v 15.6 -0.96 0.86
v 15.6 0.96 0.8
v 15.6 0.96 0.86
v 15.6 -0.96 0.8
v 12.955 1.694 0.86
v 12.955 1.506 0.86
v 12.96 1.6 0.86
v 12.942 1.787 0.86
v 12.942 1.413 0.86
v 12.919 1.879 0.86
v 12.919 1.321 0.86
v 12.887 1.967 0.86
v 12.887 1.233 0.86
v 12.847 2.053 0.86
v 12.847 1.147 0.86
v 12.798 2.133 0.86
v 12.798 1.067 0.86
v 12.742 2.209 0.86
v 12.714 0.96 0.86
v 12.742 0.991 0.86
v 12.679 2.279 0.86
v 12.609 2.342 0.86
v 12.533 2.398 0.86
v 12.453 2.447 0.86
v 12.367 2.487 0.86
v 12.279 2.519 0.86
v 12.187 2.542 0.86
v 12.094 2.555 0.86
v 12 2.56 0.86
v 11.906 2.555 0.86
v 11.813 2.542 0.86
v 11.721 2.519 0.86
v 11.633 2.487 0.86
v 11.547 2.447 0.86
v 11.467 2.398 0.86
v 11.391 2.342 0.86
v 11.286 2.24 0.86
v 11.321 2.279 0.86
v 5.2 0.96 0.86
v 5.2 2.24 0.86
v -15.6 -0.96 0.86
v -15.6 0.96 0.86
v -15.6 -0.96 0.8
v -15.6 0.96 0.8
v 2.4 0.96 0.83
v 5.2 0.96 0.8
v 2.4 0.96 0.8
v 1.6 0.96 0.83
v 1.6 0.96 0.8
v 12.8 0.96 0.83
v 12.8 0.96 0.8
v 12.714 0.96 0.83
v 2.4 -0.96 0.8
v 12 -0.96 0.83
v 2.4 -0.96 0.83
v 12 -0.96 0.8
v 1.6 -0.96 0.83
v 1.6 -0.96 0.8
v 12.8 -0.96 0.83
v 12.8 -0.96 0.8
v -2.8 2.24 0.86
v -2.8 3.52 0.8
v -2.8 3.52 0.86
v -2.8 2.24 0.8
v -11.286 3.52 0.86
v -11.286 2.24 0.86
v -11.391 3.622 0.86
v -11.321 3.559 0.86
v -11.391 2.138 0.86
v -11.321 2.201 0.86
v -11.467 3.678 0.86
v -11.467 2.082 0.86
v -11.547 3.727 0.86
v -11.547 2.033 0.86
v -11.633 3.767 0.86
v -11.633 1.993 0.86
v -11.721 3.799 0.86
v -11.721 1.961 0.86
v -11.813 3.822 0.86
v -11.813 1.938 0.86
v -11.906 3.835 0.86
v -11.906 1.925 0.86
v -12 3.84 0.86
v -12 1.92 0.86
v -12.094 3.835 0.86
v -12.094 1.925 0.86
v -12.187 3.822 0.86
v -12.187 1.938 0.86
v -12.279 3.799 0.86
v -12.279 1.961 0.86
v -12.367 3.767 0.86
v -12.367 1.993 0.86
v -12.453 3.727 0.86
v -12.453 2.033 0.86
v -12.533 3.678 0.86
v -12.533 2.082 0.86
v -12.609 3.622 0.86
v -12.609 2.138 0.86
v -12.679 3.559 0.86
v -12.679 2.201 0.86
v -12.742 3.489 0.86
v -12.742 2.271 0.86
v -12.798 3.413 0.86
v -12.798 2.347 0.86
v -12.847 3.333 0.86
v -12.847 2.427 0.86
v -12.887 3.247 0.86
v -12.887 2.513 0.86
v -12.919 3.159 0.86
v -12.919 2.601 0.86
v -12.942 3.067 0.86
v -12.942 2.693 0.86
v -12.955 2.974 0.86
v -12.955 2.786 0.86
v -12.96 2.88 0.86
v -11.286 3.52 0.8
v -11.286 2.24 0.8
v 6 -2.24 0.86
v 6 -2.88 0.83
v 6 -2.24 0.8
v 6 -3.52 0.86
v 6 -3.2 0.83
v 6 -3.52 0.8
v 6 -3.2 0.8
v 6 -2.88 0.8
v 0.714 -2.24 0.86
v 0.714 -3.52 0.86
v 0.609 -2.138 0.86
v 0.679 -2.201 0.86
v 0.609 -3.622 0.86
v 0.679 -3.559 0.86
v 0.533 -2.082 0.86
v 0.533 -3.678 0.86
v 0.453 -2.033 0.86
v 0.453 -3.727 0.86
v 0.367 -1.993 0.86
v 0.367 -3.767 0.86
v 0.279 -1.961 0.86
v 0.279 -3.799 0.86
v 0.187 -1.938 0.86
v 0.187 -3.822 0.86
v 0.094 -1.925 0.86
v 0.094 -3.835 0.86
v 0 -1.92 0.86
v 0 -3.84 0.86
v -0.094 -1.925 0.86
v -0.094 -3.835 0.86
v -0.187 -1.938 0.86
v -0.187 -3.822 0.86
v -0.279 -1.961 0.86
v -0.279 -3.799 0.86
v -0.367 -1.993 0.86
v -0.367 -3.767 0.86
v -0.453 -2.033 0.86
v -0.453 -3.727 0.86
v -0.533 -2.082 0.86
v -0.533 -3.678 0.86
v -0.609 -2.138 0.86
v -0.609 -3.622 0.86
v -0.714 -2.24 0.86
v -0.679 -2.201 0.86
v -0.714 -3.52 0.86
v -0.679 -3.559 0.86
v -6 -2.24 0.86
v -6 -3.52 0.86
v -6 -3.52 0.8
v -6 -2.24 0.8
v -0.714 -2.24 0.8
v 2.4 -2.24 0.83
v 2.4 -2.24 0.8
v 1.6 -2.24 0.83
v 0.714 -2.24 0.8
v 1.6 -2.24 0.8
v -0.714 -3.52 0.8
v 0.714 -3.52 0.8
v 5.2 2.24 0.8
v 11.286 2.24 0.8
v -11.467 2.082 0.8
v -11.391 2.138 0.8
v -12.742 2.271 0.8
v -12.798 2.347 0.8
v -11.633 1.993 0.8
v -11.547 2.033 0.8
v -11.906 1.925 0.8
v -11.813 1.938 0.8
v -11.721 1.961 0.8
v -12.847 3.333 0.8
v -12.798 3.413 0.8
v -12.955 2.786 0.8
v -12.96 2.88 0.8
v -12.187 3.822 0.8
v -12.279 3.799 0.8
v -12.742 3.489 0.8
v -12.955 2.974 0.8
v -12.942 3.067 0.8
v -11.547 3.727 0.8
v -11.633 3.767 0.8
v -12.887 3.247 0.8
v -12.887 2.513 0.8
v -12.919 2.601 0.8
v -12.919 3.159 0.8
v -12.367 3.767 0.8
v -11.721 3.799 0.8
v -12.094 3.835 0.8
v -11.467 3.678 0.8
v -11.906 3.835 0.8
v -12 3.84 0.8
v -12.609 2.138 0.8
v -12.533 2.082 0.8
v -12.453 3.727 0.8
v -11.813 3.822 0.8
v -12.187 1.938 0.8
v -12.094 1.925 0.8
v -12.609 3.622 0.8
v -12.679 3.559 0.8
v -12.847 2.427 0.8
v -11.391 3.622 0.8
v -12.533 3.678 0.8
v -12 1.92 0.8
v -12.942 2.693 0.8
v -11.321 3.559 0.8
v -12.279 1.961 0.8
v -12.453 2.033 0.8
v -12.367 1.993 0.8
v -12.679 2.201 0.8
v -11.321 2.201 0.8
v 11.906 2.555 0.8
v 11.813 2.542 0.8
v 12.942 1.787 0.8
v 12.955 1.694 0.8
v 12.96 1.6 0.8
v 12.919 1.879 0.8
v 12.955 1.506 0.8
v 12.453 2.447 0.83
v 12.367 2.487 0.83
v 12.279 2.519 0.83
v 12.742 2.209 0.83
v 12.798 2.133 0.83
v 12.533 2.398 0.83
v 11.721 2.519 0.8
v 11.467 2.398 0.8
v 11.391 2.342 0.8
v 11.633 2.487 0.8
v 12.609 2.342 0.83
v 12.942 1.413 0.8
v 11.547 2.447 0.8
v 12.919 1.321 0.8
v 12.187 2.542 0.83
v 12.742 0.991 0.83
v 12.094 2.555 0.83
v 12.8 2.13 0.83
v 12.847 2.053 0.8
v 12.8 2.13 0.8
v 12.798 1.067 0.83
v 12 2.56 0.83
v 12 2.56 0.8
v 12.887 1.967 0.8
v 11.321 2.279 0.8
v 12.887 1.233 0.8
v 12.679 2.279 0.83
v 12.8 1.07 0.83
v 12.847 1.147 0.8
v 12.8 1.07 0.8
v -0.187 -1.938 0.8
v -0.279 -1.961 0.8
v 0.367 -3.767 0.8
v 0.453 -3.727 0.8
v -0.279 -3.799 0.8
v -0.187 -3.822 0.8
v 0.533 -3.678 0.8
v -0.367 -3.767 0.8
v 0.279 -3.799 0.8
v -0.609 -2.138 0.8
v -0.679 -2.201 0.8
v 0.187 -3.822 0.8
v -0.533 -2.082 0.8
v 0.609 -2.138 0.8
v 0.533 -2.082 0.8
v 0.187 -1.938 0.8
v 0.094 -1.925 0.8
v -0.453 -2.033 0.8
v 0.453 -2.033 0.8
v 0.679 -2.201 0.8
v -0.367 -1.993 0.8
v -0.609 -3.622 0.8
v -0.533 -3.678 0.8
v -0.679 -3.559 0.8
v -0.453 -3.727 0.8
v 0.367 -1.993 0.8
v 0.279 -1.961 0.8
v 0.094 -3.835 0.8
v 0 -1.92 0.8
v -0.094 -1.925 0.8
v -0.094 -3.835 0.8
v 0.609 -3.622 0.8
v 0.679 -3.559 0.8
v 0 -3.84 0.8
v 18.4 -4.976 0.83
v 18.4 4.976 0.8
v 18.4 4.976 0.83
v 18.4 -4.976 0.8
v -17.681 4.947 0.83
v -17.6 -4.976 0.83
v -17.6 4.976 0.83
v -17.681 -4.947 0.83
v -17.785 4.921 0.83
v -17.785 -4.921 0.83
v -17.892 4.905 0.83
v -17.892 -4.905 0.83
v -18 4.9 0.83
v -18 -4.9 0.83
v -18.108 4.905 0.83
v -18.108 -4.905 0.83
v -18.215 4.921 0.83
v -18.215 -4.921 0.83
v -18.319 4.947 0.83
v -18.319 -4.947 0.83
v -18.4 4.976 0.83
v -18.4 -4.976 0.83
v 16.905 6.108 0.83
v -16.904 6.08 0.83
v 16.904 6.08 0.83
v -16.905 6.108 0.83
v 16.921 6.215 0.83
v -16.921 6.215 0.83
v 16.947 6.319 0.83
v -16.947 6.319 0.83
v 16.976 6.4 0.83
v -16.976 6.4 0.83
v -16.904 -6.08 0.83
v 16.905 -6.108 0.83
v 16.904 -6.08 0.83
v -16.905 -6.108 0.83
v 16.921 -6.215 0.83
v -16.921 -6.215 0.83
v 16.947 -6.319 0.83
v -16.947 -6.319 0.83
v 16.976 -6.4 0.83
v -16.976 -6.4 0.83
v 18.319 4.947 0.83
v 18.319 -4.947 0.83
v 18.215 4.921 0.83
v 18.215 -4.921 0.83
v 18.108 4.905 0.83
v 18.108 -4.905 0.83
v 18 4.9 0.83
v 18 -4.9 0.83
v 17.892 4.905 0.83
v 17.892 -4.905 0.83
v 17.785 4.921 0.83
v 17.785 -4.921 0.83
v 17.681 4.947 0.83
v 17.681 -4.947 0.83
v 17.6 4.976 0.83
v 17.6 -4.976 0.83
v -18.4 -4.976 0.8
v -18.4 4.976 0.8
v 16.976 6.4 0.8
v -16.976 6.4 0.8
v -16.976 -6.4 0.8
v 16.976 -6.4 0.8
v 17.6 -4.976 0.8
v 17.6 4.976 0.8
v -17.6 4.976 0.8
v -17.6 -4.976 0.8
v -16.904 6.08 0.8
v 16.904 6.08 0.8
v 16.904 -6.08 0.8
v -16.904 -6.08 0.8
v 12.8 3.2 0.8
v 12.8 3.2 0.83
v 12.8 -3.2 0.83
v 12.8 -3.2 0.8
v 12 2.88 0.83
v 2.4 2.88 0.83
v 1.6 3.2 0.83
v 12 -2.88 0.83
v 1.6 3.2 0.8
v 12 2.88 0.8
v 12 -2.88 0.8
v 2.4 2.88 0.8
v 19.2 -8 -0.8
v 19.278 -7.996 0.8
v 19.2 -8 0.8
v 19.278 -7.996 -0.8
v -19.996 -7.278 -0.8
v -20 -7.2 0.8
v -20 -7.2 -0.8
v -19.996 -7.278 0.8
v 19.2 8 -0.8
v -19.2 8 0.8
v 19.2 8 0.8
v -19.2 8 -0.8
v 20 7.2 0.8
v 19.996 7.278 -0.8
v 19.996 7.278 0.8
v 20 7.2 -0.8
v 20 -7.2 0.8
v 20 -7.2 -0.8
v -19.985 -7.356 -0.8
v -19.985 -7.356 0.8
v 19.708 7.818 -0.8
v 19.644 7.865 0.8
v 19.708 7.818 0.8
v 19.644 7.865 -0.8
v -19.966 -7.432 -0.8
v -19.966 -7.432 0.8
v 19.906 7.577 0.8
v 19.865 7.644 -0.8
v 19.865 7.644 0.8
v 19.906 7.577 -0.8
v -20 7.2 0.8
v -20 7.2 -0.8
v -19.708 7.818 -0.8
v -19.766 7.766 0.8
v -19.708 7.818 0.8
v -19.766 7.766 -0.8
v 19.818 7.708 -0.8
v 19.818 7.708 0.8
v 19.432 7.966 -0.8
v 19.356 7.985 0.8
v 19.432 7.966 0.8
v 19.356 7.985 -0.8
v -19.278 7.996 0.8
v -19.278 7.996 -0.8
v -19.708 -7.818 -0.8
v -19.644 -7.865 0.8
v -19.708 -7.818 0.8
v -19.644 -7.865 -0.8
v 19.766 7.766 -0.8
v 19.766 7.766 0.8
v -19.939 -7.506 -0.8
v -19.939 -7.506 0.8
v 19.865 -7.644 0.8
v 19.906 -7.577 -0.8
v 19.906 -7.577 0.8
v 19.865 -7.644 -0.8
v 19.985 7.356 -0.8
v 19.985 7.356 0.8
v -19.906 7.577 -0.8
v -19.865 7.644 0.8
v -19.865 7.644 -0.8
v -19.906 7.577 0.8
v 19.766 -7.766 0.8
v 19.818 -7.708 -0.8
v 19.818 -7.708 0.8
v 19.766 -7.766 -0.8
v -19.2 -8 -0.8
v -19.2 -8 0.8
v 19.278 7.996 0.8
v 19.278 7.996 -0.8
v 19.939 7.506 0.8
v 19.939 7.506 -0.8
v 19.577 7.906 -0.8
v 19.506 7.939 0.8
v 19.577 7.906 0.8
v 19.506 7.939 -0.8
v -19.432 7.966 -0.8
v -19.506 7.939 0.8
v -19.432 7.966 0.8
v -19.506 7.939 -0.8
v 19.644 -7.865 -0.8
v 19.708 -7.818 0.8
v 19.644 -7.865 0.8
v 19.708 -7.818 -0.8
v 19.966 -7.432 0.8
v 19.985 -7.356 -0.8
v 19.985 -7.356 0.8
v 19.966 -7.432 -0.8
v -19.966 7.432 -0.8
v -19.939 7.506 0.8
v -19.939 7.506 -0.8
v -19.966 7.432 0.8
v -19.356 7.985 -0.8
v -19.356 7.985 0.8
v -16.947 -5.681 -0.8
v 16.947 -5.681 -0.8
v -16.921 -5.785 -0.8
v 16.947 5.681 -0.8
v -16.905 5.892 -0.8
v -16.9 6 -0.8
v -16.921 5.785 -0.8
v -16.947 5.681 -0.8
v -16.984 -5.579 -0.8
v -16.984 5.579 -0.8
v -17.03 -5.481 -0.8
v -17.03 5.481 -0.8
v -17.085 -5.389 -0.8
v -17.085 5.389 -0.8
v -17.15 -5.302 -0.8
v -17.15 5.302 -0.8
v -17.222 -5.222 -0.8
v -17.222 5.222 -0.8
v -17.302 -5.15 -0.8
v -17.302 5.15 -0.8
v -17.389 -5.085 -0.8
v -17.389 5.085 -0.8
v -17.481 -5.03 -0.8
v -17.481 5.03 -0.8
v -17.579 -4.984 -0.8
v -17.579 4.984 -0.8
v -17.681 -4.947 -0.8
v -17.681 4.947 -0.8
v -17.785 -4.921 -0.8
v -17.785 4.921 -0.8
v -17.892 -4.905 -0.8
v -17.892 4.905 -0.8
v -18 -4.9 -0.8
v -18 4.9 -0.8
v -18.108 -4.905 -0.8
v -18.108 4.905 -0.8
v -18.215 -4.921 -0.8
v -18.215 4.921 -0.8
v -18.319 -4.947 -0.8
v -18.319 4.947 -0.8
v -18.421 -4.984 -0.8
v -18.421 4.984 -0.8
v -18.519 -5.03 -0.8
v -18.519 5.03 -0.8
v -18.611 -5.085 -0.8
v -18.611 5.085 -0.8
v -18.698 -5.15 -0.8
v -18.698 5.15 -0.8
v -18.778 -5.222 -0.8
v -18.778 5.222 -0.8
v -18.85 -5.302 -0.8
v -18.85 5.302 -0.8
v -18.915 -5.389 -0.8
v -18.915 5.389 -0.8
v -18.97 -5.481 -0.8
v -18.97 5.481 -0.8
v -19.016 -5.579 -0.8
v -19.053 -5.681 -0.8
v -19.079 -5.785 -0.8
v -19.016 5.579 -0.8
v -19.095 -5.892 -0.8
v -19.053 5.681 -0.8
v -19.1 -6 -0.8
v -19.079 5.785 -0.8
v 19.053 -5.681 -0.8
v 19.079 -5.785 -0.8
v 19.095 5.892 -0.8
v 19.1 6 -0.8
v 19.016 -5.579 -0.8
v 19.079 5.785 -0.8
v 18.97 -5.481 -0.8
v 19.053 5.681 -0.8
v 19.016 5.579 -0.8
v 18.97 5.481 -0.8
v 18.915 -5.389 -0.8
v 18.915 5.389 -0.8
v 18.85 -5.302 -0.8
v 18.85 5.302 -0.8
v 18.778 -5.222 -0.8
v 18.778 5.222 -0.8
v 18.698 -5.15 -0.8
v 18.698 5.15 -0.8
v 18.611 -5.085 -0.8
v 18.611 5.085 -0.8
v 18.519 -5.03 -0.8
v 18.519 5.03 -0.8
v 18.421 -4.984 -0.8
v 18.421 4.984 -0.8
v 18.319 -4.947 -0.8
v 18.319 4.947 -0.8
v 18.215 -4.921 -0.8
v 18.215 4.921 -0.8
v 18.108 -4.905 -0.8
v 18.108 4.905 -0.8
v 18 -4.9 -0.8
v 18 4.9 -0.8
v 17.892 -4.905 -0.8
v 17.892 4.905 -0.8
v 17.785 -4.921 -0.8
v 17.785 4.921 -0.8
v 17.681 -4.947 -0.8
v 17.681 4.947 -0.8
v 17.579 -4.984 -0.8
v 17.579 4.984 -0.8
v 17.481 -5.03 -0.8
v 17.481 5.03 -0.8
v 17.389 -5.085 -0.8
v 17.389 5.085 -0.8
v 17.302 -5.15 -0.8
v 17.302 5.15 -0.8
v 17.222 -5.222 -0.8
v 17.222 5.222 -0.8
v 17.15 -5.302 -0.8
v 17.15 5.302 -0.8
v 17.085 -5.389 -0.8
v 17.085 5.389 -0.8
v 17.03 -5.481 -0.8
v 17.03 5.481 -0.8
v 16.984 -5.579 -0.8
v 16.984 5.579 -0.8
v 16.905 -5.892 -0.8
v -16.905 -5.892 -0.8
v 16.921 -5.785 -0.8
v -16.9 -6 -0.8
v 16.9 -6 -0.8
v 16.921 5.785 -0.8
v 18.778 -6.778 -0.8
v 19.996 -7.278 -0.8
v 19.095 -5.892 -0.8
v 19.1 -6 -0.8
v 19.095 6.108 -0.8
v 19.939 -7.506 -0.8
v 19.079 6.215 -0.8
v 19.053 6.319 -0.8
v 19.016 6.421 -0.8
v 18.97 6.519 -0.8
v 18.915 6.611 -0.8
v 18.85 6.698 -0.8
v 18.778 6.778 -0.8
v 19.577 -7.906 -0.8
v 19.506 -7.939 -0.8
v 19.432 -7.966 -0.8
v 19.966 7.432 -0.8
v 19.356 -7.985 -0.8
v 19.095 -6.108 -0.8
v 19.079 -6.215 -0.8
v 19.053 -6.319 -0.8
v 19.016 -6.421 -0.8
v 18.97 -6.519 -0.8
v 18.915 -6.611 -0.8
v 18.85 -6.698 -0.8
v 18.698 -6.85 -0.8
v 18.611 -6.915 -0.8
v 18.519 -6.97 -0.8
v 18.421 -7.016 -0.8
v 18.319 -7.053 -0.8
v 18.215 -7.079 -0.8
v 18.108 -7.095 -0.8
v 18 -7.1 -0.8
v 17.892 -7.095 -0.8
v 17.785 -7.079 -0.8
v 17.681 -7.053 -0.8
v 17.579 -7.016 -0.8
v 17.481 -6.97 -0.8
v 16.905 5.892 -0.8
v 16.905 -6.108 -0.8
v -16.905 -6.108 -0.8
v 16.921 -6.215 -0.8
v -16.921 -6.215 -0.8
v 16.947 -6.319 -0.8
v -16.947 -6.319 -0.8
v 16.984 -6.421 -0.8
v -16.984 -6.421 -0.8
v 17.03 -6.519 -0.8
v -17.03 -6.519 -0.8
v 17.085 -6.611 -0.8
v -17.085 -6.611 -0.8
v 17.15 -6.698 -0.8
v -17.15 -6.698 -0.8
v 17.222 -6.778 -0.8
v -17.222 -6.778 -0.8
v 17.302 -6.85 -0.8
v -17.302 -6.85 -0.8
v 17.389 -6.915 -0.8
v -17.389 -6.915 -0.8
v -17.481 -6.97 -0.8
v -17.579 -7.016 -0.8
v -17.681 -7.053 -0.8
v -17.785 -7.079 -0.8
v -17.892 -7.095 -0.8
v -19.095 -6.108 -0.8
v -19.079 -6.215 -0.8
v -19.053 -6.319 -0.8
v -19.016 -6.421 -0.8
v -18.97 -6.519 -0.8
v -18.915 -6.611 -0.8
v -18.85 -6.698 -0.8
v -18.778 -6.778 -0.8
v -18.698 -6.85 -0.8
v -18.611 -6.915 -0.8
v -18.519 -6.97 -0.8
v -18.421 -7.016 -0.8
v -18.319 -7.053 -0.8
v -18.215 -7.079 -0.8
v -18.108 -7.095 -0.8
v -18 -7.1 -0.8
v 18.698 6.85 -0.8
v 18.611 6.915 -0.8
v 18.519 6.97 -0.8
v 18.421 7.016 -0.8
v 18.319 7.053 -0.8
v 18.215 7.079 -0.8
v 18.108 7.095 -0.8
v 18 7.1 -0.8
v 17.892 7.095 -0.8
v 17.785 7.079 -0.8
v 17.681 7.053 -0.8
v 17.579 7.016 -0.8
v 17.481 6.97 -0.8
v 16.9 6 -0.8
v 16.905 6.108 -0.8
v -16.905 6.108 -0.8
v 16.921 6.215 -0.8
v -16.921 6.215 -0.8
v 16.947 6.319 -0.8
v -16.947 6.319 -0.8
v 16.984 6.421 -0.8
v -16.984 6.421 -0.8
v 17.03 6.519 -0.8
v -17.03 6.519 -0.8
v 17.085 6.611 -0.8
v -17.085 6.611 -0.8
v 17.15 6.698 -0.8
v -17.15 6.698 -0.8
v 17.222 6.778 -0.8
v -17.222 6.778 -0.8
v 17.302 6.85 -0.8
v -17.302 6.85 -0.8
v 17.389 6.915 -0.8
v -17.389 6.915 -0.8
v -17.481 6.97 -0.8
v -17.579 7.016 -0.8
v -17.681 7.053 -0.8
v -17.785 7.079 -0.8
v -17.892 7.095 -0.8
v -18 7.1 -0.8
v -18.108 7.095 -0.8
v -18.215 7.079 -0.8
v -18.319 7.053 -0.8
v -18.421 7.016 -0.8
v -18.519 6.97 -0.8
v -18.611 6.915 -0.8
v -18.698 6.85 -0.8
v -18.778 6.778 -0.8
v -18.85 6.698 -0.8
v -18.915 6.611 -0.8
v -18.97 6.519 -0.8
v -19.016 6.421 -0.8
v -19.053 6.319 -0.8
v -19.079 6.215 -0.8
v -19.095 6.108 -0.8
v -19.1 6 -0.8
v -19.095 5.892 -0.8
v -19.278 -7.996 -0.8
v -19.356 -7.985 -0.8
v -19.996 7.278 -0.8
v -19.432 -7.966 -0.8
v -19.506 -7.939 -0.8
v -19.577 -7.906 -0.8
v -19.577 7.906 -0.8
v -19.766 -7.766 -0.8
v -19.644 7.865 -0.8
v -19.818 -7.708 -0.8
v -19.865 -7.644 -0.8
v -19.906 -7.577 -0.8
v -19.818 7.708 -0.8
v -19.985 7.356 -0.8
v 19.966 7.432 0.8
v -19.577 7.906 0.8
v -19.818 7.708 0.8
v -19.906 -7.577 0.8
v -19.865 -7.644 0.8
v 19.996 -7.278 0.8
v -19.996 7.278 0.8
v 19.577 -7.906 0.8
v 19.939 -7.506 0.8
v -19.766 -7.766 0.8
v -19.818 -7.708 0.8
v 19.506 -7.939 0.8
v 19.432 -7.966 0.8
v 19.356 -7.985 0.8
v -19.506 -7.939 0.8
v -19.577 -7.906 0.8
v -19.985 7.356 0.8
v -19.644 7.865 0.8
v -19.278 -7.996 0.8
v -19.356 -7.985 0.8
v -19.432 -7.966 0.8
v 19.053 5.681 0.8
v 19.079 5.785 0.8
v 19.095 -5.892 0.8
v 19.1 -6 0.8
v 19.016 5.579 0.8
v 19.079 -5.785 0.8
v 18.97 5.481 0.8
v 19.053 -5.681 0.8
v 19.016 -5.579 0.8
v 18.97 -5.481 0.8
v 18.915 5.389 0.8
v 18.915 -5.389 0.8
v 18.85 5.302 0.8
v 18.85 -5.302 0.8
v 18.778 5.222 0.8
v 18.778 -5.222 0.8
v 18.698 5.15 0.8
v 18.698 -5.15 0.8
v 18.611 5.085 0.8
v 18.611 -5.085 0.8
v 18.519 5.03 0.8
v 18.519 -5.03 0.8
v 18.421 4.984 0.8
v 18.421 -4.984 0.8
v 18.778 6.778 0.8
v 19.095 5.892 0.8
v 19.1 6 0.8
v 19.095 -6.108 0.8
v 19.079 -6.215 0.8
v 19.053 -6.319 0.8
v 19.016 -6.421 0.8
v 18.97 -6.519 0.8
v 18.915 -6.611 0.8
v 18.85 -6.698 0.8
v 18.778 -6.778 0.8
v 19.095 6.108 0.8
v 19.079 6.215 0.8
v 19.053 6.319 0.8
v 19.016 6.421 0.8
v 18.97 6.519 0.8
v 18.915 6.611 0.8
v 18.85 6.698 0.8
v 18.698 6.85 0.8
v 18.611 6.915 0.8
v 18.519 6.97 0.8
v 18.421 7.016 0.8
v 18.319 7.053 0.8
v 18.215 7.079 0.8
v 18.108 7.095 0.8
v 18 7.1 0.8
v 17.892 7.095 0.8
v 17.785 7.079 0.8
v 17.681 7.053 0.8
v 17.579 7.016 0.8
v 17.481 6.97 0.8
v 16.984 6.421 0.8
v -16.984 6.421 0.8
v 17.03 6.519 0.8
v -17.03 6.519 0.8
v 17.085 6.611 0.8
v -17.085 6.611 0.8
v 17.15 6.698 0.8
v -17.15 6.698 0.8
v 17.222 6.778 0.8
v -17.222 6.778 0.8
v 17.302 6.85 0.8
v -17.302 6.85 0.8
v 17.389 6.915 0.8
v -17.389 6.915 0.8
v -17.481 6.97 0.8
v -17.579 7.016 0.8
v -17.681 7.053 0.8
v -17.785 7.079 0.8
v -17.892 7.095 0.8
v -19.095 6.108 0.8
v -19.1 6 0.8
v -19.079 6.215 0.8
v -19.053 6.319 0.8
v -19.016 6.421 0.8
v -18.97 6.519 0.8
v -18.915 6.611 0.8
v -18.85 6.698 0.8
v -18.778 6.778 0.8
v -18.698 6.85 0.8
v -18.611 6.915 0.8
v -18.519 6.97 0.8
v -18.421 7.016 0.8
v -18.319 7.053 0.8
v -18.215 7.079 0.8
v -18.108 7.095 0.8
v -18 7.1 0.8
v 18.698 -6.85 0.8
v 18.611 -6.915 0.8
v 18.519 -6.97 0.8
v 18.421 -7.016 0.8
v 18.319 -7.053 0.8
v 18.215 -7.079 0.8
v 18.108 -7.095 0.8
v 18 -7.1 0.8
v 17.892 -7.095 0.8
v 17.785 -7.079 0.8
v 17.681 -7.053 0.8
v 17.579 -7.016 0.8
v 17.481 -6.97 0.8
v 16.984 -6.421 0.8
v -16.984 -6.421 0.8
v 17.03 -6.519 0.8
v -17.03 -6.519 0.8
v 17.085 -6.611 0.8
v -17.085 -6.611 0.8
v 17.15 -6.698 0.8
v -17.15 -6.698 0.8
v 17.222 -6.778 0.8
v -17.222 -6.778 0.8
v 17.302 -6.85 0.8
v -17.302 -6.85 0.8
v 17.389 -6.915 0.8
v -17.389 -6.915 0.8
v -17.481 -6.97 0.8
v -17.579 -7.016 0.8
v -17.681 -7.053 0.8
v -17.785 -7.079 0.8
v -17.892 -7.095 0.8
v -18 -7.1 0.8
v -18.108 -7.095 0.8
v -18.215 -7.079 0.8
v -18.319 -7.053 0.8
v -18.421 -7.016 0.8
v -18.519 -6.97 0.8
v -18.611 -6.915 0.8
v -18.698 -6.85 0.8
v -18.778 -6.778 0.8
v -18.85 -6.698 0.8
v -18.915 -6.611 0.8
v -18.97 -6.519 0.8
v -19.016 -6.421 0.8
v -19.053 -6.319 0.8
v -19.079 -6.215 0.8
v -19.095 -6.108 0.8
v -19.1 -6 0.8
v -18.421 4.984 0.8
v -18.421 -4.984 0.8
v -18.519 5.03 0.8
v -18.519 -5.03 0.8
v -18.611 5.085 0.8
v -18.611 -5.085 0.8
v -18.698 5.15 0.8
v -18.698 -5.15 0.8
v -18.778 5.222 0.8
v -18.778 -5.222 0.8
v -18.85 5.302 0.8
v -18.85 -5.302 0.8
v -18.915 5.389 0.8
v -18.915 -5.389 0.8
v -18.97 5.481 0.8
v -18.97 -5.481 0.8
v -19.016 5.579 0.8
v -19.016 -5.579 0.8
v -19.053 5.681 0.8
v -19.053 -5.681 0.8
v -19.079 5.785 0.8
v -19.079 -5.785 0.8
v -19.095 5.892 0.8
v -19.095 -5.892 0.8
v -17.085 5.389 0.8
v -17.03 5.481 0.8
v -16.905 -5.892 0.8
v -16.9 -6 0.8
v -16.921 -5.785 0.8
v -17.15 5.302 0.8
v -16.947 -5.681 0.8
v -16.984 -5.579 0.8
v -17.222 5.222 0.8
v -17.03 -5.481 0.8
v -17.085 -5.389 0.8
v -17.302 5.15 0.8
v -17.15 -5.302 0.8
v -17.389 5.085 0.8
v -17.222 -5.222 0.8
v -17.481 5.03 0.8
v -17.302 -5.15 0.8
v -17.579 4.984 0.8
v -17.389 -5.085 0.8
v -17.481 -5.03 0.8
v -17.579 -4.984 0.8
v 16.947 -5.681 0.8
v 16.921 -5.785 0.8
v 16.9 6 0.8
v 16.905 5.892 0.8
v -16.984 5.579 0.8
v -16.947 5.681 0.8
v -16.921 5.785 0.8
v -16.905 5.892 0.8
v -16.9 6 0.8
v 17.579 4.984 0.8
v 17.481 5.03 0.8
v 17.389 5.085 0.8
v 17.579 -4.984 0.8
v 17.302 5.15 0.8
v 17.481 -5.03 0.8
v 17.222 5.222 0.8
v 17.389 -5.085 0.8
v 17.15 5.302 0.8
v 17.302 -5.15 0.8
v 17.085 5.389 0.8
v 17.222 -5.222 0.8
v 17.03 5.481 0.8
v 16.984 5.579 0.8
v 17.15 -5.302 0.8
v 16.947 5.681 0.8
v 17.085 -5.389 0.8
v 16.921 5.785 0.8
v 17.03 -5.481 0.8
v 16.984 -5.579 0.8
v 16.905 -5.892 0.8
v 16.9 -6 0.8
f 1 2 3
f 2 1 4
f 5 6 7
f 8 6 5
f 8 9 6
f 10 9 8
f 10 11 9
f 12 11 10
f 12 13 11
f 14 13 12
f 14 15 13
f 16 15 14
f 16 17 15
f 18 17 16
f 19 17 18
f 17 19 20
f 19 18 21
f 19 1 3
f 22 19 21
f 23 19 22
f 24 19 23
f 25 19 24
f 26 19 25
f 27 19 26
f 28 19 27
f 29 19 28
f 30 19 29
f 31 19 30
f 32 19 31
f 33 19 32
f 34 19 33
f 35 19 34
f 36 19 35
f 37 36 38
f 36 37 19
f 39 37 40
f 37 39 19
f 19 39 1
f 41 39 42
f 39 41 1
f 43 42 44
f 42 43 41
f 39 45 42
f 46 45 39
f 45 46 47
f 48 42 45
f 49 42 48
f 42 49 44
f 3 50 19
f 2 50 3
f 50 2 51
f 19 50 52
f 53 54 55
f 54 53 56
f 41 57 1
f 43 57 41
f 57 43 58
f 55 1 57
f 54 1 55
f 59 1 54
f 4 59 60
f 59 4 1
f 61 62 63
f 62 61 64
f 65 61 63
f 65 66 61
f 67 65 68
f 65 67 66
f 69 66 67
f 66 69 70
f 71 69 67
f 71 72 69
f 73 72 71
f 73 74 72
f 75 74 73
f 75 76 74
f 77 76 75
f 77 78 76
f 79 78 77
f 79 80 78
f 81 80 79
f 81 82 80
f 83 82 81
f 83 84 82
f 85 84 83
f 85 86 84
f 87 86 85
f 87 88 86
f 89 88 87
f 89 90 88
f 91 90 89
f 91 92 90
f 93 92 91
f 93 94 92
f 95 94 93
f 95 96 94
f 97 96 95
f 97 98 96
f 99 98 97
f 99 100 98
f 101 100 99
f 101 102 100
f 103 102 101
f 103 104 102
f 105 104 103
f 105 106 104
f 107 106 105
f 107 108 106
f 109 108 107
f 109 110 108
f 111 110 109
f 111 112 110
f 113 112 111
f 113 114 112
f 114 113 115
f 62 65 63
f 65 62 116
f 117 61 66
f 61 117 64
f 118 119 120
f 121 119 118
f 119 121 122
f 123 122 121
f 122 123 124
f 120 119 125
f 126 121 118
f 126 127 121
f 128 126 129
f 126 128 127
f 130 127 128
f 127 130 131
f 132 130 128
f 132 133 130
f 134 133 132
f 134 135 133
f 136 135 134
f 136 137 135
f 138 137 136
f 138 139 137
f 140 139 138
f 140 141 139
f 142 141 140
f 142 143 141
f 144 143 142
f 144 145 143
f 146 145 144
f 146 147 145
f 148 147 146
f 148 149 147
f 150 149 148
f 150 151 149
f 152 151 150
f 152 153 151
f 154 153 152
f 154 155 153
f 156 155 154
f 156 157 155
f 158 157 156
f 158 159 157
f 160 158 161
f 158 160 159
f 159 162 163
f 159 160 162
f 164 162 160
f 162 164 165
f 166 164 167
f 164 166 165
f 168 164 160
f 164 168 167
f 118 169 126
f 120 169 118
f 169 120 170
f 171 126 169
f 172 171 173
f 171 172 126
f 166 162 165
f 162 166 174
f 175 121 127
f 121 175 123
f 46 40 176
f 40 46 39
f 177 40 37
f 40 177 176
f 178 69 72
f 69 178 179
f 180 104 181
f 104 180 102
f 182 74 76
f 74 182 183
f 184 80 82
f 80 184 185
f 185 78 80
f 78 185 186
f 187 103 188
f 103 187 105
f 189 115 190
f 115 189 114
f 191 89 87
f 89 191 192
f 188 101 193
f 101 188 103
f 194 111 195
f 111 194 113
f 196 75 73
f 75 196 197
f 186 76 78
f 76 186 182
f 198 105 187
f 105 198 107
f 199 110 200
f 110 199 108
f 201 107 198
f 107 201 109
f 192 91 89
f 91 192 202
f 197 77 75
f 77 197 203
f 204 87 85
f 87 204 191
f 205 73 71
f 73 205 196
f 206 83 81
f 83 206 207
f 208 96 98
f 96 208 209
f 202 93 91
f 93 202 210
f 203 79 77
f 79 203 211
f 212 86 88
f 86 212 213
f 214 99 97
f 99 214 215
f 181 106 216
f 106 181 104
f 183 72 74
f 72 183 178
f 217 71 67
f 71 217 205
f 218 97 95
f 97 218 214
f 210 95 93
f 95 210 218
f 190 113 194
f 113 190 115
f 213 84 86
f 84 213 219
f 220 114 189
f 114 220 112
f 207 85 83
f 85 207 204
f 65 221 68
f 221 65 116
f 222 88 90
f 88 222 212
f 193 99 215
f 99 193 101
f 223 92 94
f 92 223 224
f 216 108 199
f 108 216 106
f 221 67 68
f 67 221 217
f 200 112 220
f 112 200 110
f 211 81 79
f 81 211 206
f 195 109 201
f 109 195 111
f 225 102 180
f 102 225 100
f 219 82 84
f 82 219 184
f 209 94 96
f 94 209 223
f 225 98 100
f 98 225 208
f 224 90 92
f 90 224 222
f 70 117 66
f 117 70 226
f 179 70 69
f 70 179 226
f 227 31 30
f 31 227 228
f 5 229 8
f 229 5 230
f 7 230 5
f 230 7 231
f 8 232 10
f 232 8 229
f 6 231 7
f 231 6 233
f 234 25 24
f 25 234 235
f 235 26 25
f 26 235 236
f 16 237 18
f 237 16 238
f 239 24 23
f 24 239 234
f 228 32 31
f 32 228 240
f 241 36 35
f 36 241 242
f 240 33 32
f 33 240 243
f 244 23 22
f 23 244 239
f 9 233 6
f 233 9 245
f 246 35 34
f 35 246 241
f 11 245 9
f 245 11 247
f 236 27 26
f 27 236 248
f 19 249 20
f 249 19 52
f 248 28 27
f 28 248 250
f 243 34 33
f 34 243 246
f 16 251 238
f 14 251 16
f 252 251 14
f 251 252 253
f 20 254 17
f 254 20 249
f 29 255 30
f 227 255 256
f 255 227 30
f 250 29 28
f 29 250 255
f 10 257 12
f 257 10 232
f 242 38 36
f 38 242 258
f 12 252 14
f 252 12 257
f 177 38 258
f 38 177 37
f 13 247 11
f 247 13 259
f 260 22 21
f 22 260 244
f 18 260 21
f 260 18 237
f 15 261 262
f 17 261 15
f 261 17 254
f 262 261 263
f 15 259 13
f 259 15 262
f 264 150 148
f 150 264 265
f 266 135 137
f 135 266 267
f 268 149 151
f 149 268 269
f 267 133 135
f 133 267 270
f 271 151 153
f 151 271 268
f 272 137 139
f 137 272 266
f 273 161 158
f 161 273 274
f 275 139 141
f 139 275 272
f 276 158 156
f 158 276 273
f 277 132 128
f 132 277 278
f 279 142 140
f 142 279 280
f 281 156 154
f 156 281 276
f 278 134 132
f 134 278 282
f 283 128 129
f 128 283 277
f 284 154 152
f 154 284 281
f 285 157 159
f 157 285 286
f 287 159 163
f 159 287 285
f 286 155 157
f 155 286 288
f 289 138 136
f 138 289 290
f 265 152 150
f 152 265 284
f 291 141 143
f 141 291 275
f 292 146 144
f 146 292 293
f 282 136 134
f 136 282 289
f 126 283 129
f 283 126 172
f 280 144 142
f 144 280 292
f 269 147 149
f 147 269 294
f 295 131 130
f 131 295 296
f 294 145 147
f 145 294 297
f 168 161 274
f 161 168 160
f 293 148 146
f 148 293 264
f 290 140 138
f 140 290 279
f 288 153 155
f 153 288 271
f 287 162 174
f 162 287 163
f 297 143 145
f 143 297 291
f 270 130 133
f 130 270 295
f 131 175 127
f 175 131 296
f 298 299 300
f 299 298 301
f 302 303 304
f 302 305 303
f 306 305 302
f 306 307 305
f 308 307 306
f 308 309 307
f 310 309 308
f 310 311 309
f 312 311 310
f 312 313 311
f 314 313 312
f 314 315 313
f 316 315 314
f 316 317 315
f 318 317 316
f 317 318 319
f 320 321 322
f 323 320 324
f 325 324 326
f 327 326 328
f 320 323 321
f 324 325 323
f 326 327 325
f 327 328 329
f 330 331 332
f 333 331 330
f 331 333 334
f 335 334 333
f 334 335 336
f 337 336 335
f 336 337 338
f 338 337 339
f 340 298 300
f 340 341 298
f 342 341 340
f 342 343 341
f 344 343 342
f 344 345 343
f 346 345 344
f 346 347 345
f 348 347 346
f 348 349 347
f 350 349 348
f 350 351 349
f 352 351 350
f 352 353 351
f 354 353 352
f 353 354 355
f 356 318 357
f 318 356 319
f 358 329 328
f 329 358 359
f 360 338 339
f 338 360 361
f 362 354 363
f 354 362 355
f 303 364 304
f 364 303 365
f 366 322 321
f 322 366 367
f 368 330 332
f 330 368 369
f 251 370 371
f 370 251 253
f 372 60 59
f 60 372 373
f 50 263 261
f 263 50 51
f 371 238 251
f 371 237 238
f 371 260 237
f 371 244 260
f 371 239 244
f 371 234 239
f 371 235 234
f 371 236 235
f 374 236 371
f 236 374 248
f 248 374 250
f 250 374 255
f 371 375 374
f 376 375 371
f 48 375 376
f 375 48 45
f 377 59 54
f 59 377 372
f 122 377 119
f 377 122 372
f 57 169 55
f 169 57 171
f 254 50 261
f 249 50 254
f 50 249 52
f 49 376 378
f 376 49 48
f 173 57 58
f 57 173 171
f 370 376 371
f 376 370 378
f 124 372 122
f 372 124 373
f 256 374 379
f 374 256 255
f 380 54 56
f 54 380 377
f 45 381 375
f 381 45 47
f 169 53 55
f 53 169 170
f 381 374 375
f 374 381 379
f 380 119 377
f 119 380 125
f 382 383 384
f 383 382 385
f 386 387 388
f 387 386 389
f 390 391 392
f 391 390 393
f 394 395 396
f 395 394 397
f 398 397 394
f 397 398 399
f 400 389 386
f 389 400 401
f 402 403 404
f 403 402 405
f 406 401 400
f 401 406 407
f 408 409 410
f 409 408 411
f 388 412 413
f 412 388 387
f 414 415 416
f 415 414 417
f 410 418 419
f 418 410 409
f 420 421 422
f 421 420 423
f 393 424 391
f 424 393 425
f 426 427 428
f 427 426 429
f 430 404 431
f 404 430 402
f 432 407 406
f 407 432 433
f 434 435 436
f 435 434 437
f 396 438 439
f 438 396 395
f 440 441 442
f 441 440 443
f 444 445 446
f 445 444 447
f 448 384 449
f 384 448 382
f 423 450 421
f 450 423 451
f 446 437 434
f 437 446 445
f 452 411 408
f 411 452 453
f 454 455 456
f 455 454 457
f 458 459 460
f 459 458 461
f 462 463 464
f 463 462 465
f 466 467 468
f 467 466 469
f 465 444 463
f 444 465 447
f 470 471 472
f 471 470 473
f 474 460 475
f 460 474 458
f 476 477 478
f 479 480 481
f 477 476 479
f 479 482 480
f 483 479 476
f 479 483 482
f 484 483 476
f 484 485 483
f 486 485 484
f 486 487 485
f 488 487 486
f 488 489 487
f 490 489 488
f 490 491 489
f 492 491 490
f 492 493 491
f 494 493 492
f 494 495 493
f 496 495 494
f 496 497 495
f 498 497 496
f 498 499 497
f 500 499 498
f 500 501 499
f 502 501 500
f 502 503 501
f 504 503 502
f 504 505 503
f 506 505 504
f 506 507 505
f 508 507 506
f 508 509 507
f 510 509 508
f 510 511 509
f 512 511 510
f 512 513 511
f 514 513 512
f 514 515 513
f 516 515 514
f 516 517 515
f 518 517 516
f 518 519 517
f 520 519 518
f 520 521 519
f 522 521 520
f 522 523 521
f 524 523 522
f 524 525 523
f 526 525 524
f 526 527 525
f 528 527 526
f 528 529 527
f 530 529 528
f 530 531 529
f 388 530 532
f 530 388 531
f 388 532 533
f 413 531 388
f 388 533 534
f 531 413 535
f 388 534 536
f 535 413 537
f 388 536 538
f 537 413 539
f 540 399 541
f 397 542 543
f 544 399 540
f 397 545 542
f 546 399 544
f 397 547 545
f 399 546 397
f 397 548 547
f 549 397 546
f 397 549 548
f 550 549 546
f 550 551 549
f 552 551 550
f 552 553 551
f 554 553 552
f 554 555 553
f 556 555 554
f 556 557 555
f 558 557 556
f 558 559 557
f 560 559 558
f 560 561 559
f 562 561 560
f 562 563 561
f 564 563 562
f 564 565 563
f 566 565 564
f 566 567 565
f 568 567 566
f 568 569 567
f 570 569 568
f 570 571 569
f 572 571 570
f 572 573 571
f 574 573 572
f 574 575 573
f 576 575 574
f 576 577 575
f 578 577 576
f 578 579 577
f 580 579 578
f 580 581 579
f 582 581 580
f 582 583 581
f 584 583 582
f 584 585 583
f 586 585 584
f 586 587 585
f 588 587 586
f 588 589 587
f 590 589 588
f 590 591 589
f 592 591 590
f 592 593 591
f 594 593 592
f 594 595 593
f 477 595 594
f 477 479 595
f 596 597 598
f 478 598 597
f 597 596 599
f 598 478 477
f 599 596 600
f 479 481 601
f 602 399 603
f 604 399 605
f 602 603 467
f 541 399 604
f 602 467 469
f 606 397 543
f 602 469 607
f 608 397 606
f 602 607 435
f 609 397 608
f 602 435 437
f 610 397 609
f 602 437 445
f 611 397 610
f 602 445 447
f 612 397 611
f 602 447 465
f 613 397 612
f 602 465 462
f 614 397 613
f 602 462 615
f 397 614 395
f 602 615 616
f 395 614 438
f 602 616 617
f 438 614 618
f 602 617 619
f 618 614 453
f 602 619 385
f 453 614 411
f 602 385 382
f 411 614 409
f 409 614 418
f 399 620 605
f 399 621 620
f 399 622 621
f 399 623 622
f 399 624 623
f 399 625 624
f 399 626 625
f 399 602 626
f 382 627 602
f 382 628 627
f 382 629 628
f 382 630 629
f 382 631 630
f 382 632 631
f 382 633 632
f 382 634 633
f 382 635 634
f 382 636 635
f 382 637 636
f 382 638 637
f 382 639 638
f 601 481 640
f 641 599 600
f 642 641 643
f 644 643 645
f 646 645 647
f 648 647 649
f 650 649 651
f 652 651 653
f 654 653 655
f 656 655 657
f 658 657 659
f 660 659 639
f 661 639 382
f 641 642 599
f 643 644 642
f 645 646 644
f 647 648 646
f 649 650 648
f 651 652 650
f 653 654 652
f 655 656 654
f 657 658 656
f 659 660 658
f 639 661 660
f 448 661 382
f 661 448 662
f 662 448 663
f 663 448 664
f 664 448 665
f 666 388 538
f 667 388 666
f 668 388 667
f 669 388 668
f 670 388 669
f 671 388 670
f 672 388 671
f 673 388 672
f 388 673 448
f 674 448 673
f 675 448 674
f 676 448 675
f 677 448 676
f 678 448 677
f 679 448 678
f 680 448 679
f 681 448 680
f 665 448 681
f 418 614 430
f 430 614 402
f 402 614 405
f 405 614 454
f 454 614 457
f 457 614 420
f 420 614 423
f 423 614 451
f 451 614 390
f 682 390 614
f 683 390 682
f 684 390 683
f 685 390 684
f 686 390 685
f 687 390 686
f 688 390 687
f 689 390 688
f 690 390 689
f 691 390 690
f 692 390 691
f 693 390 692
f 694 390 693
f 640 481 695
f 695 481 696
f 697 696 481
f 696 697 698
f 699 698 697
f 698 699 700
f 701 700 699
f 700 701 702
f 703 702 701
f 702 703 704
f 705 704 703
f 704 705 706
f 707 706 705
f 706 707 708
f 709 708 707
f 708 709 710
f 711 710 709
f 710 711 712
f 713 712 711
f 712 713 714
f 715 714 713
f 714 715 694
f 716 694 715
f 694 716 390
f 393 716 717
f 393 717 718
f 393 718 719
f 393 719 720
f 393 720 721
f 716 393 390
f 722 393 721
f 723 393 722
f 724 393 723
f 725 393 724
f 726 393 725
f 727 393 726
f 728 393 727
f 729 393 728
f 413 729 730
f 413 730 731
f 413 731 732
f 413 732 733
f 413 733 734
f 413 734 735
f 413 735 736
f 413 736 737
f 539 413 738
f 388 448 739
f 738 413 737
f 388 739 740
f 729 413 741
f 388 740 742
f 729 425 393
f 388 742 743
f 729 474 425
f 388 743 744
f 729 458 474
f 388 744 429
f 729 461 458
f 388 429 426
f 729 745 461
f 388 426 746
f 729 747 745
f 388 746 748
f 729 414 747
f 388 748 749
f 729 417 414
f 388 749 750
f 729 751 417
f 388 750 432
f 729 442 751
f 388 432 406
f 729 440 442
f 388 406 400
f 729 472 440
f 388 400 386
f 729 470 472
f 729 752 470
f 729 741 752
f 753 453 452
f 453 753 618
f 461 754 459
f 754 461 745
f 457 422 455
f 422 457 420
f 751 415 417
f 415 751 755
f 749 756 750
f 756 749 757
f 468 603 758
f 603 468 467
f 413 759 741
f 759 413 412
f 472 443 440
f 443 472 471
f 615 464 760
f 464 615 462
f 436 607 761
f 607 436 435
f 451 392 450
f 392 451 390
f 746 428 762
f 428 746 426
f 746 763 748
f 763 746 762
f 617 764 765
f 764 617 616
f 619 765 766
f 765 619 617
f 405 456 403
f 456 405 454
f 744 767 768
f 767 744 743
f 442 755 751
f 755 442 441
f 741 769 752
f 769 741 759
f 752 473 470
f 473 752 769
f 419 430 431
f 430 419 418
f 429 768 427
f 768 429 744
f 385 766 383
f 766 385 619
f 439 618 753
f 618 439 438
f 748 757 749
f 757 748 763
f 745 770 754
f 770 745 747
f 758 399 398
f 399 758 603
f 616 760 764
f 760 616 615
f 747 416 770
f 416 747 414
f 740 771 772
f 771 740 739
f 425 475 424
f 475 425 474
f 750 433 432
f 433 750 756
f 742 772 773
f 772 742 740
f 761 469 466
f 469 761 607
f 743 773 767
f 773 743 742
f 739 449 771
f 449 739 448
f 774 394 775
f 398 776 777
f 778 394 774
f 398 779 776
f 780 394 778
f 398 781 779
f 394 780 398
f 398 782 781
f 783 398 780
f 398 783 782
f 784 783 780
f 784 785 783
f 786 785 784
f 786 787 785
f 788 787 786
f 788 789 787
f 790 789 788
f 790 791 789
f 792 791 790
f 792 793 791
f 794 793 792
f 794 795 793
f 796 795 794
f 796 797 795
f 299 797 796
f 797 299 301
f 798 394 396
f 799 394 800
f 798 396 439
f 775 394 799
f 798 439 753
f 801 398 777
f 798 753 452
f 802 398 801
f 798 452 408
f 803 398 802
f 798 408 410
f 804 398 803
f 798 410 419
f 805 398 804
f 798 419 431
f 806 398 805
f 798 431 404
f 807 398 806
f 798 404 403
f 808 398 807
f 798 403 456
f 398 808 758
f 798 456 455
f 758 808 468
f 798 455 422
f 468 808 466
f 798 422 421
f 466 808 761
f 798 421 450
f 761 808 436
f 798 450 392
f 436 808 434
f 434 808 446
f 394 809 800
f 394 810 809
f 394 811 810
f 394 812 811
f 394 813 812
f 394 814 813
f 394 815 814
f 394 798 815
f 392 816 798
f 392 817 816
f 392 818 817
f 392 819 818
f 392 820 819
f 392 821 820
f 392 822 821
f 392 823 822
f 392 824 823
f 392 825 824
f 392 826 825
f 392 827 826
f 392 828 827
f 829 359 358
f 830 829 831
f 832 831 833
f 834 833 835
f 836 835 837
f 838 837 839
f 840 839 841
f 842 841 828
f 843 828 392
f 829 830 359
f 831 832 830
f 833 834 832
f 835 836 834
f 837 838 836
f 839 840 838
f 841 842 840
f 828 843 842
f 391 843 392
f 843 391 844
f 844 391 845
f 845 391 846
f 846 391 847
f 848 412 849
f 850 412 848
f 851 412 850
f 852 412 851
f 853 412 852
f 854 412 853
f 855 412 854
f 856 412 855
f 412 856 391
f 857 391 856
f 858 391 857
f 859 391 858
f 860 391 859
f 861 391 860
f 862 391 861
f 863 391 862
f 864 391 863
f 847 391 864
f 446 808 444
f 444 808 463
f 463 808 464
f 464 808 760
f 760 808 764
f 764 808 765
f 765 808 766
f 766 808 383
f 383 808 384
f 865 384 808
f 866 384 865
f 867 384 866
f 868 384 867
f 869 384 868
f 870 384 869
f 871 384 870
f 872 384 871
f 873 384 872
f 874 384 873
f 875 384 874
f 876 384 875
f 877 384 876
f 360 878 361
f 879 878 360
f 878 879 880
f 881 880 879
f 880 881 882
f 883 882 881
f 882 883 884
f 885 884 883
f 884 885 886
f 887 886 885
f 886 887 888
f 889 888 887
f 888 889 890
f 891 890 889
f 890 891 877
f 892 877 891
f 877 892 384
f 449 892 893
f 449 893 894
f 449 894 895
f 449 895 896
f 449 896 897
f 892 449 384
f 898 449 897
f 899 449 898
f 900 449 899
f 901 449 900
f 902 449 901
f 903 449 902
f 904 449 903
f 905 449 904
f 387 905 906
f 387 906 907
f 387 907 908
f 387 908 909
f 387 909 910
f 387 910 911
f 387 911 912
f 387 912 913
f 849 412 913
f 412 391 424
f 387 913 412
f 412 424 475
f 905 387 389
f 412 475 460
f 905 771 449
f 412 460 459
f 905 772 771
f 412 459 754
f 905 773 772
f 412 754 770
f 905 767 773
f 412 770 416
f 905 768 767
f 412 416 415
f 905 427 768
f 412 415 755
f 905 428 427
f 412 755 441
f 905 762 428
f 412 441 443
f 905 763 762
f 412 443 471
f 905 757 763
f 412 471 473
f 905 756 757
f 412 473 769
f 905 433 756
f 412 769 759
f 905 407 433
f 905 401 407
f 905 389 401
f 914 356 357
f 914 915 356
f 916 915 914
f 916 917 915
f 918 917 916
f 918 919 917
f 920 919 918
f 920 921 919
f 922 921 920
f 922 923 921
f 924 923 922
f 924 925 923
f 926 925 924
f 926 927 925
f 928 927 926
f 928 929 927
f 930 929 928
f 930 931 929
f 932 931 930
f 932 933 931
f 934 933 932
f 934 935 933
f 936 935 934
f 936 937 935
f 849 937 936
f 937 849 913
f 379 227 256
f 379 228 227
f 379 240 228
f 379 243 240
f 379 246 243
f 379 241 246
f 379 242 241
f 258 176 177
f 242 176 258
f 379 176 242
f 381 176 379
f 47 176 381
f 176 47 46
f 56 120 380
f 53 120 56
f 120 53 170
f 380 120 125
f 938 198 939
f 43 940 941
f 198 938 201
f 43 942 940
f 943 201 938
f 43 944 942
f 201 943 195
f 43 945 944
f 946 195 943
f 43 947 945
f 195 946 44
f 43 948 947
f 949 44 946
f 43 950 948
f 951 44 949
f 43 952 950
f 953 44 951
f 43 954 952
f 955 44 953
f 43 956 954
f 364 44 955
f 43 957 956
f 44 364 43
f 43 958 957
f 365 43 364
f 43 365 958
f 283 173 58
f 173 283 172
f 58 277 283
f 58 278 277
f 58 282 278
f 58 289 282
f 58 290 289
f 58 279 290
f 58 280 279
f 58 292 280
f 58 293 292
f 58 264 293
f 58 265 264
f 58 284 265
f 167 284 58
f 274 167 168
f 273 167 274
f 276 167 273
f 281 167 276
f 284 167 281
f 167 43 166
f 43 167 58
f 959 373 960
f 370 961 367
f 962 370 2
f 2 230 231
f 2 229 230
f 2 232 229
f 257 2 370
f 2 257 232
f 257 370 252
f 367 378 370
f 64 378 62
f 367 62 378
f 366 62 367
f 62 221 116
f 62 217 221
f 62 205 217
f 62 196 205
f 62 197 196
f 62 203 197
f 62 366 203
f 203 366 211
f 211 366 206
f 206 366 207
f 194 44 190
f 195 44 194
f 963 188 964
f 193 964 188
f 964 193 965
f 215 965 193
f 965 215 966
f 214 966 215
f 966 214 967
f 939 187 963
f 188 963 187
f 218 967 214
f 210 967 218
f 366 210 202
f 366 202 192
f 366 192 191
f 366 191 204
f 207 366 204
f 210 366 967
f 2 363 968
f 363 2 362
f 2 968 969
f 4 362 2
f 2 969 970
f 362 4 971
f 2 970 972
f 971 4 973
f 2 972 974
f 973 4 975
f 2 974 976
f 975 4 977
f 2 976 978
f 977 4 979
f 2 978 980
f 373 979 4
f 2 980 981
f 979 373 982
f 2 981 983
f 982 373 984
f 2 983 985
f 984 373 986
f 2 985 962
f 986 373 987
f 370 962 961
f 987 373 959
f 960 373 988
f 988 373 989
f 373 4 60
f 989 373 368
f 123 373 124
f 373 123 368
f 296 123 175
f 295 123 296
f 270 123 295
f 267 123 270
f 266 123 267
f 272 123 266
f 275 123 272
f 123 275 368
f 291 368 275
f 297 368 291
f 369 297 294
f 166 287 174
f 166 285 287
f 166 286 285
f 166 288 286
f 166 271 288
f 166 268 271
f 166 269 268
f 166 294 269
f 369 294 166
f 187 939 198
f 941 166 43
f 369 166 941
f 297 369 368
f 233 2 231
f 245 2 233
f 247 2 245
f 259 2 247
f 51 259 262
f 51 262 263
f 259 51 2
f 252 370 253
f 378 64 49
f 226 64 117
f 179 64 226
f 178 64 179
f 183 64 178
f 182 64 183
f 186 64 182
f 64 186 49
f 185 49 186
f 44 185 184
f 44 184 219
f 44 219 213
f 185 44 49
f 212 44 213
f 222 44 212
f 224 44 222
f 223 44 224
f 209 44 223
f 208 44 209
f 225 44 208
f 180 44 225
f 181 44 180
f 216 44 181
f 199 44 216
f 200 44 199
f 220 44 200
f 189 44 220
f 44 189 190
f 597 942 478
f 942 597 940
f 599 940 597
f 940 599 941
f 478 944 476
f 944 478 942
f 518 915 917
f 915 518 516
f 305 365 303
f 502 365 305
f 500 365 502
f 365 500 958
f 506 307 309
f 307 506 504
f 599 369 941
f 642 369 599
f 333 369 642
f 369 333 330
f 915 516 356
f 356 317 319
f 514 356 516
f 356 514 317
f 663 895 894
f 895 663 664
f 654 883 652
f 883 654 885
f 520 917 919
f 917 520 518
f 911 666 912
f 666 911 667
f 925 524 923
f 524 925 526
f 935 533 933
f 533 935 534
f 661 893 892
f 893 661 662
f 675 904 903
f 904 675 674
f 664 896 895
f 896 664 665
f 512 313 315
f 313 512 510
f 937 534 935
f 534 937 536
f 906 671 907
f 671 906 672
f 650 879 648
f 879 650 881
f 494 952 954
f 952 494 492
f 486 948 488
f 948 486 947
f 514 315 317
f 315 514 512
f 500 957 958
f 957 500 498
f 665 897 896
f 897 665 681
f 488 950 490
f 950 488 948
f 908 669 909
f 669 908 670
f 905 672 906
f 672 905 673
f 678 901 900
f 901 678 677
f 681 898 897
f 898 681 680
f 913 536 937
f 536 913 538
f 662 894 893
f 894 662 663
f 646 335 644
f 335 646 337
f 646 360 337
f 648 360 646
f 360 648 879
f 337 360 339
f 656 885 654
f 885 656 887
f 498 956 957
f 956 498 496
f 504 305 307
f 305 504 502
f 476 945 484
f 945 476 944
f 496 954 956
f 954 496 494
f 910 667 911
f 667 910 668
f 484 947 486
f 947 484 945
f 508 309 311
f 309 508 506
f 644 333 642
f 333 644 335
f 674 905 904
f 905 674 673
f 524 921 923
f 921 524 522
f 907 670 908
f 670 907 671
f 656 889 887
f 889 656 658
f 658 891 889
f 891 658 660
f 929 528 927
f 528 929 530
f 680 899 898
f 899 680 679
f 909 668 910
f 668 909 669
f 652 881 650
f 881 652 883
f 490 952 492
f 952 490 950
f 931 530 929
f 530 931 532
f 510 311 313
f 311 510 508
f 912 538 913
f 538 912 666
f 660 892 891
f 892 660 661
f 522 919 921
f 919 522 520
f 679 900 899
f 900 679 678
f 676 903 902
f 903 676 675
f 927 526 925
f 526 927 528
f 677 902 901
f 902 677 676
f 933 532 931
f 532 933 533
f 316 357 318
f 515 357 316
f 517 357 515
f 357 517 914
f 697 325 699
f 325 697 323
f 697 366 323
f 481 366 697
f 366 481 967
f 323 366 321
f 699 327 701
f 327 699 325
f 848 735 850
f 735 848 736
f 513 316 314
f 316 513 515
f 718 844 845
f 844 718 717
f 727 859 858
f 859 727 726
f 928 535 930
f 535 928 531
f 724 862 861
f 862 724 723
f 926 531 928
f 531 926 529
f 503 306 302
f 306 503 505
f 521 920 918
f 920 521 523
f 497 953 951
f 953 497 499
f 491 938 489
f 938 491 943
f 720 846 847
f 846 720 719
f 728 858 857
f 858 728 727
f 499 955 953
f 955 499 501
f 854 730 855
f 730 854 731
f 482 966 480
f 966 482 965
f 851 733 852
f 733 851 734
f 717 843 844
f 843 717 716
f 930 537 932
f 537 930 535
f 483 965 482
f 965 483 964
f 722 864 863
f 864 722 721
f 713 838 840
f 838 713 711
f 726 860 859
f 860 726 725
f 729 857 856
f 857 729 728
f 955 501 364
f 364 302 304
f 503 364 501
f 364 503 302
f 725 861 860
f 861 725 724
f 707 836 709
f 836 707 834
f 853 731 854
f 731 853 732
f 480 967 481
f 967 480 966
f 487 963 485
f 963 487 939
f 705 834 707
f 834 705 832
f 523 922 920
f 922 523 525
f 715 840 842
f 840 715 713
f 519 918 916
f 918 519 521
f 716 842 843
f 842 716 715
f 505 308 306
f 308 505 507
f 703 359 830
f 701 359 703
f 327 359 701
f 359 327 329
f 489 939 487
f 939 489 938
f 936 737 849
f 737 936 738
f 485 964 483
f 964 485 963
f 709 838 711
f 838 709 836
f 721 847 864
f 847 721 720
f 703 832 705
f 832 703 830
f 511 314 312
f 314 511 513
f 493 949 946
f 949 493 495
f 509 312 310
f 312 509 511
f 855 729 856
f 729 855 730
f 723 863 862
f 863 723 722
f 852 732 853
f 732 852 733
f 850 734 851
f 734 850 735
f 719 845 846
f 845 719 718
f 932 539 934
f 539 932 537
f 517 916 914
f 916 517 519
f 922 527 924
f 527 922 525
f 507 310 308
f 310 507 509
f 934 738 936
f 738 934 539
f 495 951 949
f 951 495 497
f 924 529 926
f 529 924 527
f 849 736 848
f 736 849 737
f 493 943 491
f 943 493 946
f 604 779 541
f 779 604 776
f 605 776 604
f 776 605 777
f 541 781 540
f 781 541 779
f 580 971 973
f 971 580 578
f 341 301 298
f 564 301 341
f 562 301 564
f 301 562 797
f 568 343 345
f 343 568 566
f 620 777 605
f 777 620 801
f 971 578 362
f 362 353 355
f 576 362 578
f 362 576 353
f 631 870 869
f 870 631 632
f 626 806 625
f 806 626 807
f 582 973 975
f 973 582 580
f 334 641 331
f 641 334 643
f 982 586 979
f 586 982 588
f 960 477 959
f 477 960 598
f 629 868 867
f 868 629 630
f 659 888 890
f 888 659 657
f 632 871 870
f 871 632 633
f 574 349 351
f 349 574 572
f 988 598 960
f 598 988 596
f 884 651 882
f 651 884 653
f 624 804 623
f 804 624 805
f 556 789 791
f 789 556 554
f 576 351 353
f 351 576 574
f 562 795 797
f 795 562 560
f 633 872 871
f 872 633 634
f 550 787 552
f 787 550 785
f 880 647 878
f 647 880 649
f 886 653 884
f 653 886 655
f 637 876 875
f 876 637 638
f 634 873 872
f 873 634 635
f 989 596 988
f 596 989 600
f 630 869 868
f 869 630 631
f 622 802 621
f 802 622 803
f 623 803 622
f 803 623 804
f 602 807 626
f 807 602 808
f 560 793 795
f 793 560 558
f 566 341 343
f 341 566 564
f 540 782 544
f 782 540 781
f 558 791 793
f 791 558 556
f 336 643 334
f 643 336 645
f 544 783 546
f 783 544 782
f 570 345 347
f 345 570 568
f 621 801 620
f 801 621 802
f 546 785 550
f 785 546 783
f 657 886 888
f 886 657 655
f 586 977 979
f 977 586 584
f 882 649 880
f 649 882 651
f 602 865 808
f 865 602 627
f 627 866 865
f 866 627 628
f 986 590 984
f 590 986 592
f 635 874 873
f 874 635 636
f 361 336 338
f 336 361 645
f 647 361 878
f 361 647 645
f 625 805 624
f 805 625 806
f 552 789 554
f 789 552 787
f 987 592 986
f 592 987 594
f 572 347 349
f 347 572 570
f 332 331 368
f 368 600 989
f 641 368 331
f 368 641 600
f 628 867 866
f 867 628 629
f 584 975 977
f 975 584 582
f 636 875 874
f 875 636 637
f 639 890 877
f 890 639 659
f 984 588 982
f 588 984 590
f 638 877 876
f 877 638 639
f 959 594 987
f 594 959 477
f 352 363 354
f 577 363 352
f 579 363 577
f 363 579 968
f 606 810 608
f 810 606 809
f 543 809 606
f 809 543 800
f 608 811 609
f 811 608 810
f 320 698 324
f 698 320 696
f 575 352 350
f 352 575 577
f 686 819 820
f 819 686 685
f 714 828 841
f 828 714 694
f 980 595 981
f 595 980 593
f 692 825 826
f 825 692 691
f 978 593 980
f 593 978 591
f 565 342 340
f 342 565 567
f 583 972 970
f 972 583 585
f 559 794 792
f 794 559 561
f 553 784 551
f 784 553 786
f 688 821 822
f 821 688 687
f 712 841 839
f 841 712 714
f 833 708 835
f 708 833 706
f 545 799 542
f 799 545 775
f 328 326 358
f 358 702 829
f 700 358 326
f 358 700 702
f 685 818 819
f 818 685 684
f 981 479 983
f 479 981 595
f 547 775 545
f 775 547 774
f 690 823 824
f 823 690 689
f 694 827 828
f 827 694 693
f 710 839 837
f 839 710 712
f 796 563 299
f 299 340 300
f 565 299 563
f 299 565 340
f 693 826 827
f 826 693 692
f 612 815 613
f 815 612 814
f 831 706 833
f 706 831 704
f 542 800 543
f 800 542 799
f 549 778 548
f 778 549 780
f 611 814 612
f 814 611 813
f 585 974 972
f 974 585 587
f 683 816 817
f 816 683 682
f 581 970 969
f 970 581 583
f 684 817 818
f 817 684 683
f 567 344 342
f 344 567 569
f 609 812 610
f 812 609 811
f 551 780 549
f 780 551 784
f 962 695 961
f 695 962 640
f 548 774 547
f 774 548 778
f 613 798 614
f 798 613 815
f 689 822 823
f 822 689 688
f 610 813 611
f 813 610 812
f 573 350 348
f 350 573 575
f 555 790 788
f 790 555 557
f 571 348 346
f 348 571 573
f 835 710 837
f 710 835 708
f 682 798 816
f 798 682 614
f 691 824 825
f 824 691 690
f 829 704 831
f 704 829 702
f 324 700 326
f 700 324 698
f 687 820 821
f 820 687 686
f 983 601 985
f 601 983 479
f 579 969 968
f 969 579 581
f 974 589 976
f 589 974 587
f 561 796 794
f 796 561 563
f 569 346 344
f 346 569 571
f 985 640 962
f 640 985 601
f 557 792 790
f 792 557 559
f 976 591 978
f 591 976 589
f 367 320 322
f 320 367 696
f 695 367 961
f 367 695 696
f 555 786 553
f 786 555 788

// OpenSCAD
$fn = 64;

// PCB dimensions (mm)
pcb_length = 40.0;
pcb_width  = 16.0;
pcb_thick  = 1.6;

// Visual detail thicknesses (kept small, but non-zero)
copper_t   = 0.08;
silk_t     = 0.05;

// Edge rounding (small fillet-like via hull of corner posts)
corner_r   = 0.8;

// Hole parameters
hole_d     = 2.2;
hole_edge  = 2.0; // distance from each edge to hole center

// Small overlap to guarantee connectivity between added surface details and board
overlap    = 0.02;

module rounded_plate(L, W, T, r) {
    // One connected solid, centered at origin
    hull() {
        for (sx = [-1, 1], sy = [-1, 1]) {
            translate([sx*(L/2 - r), sy*(W/2 - r), 0])
                cylinder(h=T, r=r, center=true);
        }
    }
}

module pcb_with_details(L, W, T) {
    difference() {
        union() {
            // FR4 board
            color([0.05, 0.45, 0.18])
                rounded_plate(L, W, T, corner_r);

            // Top copper traces (raised)
            color([0.80, 0.45, 0.10])
            translate([0, 0, T/2 + copper_t/2 - overlap])
            union() {
                // Main bus
                cube([L*0.78, W*0.12, copper_t], center=true);

                // A few branches (all connected to the bus)
                translate([-L*0.18,  W*0.18, 0]) cube([L*0.22, W*0.08, copper_t], center=true);
                translate([ 0,       -W*0.18, 0]) cube([L*0.30, W*0.08, copper_t], center=true);
                translate([ L*0.22,  W*0.10, 0]) cube([L*0.18, W*0.08, copper_t], center=true);

                // Small pads connected to traces
                translate([-L*0.30,  W*0.18, 0]) cylinder(h=copper_t, r=W*0.06, center=true);
                translate([ L*0.30,  W*0.10, 0]) cylinder(h=copper_t, r=W*0.06, center=true);
                translate([ 0,      -W*0.18, 0]) cylinder(h=copper_t, r=W*0.06, center=true);
            }

            // Top silkscreen (raised)
            color([0.95, 0.95, 0.95])
            translate([0, 0, T/2 + silk_t/2 - overlap])
            union() {
                // Border line near edge
                difference() {
                    cube([L*0.92, W*0.80, silk_t], center=true);
                    cube([L*0.88, W*0.76, silk_t + 2*overlap], center=true);
                }
                // A small "component outline" rectangle
                translate([L*0.18, 0, 0])
                difference() {
                    cube([L*0.28, W*0.40, silk_t], center=true);
                    cube([L*0.24, W*0.36, silk_t + 2*overlap], center=true);
                }
            }
        }

        // Mounting holes (through)
        for (sx = [-1, 1], sy = [-1, 1]) {
            translate([sx*(L/2 - hole_edge), sy*(W/2 - hole_edge), 0])
                cylinder(h=T + 2*(copper_t + silk_t + 1), d=hole_d, center=true);
        }
    }
}

pcb_with_details(pcb_length, pcb_width, pcb_thick);
